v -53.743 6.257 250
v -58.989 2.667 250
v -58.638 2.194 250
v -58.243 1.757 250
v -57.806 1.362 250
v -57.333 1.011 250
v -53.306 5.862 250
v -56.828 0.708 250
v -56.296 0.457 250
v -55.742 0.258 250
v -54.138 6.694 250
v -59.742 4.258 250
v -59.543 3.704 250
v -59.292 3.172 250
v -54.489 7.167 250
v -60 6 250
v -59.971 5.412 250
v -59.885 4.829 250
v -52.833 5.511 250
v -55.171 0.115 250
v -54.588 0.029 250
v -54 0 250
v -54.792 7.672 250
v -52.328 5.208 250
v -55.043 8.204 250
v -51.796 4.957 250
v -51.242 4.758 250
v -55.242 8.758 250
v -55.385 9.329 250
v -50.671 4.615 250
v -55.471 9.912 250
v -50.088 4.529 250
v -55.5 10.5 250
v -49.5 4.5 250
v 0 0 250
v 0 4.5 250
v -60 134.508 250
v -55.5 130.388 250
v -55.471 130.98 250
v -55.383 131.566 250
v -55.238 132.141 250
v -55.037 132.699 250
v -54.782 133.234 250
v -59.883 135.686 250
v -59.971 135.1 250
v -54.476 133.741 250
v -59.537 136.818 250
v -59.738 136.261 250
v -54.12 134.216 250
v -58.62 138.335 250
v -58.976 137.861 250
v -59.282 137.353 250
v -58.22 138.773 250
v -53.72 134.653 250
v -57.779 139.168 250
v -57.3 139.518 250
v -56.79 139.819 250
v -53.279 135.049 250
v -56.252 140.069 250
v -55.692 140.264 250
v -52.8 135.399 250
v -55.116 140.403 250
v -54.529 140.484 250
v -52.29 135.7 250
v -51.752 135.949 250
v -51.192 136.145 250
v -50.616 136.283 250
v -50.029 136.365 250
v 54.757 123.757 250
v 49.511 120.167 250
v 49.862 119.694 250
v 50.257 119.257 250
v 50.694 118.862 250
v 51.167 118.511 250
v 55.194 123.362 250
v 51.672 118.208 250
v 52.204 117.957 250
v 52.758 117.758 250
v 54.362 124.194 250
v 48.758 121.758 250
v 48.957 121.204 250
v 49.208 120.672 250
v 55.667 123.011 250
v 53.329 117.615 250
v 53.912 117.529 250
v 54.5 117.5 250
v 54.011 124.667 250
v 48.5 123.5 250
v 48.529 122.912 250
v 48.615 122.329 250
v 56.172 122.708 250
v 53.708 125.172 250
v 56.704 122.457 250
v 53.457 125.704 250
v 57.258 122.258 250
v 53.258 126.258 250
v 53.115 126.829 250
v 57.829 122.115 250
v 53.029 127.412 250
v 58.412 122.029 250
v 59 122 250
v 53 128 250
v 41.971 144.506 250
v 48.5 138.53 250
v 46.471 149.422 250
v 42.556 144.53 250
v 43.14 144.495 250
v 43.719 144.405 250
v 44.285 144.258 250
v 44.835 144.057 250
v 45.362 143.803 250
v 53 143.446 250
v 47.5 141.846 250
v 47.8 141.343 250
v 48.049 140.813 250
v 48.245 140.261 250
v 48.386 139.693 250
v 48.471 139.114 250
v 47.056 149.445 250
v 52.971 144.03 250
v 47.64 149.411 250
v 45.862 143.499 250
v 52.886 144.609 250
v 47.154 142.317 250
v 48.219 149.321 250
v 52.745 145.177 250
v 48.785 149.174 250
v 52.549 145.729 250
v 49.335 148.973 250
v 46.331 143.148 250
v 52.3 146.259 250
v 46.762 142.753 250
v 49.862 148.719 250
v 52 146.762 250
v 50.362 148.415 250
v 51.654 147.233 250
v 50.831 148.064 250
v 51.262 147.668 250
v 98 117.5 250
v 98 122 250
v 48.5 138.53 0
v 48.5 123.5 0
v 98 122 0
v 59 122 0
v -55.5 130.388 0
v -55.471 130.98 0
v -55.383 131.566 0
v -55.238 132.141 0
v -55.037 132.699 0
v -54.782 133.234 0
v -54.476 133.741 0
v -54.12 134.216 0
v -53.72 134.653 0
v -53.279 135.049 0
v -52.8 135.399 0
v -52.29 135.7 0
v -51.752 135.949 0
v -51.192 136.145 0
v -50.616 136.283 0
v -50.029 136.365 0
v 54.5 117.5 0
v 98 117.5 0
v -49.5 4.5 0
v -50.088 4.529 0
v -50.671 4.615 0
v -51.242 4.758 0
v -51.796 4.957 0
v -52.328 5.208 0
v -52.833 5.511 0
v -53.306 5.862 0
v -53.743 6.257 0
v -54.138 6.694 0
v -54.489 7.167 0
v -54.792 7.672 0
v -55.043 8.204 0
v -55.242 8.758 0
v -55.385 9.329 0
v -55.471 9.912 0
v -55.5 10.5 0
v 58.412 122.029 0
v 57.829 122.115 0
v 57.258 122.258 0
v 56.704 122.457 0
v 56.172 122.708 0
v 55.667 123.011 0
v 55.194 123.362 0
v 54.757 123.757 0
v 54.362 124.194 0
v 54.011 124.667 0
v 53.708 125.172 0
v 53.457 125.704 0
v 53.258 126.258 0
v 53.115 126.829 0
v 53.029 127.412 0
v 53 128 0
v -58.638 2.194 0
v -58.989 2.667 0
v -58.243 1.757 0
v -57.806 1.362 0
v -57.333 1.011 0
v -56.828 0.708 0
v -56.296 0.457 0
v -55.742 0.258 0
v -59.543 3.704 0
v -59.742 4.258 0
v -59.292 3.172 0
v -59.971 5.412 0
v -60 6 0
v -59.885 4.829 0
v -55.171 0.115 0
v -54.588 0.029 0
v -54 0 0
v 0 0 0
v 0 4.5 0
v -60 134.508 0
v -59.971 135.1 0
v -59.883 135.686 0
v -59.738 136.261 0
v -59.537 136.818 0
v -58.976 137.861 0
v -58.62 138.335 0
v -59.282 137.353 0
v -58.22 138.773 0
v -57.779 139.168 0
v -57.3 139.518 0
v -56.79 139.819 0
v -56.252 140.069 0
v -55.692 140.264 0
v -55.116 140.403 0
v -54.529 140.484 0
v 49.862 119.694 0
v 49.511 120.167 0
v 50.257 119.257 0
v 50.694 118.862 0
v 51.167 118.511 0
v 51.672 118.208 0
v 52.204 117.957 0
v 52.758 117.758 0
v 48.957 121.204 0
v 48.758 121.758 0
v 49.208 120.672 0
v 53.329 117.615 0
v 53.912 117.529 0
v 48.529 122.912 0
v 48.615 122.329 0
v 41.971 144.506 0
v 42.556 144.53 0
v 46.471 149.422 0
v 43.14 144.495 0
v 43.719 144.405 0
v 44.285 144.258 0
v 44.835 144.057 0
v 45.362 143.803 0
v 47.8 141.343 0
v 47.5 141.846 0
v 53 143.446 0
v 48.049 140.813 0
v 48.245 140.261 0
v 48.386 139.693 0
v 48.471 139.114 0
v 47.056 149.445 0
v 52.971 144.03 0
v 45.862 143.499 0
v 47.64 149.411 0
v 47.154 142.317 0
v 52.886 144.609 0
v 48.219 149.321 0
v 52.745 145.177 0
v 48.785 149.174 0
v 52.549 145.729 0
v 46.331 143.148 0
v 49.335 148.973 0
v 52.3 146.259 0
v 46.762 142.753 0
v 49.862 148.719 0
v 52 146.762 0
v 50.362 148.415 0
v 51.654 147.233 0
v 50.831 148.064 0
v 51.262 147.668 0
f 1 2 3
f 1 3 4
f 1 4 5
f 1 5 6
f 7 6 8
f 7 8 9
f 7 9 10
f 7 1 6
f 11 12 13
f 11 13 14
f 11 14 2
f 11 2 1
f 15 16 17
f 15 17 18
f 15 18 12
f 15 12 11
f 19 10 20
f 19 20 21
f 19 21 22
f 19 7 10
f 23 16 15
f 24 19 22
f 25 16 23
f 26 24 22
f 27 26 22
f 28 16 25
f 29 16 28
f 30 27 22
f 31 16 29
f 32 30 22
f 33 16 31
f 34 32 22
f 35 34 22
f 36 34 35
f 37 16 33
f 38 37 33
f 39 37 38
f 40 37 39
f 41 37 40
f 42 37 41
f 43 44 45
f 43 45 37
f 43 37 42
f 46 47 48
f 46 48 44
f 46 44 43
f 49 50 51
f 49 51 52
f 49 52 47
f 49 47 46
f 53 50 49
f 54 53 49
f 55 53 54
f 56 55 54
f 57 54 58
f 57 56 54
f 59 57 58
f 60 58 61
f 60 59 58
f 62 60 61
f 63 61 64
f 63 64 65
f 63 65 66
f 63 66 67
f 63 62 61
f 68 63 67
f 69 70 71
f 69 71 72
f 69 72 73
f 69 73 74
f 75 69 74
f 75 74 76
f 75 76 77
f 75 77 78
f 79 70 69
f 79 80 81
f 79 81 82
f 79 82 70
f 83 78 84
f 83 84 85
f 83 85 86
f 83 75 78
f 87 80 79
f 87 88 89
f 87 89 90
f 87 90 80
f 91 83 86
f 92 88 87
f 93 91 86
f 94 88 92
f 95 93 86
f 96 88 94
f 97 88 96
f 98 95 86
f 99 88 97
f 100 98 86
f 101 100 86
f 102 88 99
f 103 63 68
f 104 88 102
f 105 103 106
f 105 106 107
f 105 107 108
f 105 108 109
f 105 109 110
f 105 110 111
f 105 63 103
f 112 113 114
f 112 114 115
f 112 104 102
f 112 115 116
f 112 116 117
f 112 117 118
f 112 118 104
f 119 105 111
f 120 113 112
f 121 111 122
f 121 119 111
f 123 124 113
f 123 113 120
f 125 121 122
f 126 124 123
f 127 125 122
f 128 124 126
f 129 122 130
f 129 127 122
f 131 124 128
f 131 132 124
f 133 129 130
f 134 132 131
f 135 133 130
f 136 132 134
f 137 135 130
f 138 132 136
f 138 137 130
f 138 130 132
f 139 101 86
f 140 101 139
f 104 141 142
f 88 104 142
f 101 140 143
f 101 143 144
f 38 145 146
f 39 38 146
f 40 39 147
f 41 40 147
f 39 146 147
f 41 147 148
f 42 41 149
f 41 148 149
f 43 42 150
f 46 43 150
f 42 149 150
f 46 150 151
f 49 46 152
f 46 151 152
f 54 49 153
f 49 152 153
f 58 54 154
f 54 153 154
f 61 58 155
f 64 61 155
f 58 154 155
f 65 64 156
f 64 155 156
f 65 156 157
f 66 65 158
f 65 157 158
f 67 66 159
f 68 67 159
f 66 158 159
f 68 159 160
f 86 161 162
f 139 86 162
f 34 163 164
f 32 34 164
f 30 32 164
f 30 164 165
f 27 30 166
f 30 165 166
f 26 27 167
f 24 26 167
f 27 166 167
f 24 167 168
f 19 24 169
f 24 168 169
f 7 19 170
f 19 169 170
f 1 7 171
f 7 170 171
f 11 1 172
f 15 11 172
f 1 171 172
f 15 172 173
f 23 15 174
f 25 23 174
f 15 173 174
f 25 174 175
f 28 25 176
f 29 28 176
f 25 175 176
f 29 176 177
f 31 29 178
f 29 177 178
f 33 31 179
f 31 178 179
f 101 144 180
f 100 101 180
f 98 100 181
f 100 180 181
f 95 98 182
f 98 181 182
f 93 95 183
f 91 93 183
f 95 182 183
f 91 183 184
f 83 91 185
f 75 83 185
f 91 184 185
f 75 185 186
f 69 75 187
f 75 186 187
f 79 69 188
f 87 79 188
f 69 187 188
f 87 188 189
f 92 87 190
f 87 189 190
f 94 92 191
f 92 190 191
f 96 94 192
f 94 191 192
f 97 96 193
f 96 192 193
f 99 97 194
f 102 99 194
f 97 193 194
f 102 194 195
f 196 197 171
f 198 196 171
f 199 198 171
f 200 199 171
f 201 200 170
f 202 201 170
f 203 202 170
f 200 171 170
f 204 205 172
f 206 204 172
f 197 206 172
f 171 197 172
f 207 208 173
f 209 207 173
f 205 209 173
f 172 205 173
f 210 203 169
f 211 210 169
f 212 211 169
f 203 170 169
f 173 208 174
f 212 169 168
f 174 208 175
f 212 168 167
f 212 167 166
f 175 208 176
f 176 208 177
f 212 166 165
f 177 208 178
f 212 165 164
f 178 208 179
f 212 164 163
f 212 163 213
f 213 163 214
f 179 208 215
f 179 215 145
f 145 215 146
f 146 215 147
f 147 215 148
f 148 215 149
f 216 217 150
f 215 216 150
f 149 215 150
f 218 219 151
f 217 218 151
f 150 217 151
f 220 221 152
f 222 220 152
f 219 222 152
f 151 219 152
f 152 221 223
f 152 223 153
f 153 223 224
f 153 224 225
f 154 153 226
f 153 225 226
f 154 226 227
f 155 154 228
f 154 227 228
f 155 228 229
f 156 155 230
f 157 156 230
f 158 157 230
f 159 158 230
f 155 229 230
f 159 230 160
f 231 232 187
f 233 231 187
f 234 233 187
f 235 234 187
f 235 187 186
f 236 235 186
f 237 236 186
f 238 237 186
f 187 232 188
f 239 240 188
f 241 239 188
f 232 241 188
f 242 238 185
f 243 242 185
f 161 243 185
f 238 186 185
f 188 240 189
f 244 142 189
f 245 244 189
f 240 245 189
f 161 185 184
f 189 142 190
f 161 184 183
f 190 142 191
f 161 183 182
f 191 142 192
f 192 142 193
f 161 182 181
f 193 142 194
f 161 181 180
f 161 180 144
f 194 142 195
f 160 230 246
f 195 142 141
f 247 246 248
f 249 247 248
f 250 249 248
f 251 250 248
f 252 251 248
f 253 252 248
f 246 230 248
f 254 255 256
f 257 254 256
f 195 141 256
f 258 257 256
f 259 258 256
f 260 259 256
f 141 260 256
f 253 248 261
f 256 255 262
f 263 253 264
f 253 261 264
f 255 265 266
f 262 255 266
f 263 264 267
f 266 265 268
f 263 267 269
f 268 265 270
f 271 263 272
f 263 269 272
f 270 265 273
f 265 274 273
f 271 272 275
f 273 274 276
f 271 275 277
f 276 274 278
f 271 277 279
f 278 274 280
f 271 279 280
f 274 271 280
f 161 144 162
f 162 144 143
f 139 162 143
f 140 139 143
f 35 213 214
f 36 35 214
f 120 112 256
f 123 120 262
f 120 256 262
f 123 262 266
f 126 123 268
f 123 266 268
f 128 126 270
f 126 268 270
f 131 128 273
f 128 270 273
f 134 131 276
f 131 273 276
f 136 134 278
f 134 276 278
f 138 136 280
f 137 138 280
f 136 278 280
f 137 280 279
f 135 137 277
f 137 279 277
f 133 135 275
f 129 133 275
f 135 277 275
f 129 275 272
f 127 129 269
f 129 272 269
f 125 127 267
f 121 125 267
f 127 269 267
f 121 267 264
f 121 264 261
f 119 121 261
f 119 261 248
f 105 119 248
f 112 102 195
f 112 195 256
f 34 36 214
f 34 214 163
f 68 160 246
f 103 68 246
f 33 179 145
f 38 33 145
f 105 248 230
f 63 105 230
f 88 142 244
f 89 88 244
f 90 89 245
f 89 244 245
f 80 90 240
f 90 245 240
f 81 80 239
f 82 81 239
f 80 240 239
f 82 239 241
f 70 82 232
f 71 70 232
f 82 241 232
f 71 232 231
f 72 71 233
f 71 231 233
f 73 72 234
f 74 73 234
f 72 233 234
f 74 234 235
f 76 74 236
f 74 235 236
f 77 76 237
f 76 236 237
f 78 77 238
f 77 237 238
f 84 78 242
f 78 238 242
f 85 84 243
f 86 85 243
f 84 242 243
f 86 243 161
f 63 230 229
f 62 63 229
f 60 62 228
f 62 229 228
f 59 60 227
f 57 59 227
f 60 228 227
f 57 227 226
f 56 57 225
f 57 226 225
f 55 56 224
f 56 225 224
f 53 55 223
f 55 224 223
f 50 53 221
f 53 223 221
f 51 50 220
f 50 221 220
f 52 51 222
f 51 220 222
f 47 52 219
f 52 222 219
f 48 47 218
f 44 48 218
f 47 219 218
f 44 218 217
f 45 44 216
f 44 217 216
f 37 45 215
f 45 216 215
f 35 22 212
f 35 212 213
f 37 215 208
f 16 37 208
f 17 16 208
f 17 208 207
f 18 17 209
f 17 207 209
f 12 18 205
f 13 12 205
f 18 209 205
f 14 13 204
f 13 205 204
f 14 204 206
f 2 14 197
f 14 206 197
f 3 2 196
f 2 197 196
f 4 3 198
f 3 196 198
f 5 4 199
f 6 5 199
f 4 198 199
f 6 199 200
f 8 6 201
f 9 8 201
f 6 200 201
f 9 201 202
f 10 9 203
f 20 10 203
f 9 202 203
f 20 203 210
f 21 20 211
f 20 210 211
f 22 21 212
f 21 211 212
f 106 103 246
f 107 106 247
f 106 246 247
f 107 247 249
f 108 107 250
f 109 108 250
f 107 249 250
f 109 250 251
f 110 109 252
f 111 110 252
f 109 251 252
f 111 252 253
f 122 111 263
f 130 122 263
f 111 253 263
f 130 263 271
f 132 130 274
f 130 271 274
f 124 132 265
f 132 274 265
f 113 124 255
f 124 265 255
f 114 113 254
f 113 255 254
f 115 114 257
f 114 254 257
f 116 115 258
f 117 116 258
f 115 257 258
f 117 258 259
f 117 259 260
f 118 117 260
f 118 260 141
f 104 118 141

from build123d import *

# Parameters (mm, degrees)
F1_DEPTH = 250


with BuildPart() as f1:
    # F0 (on Top) → F1 (new body)
    with BuildSketch(Plane.XY):
        with BuildLine():
            Line((-54, 0), (0, 0))
            Line((0, 0), (0, 4.5))
            Line((0, 4.5), (-49.5, 4.5))
            ThreePointArc((-49.5, 4.5), (-53.742641, 6.257359), (-55.5, 10.5))
            Line((-55.5, 10.5), (-55.5, 130.388169))
            ThreePointArc((-55.5, 130.388169), (-53.925689, 134.439499), (-50.028906, 136.364811))
            Line((-50.028906, 136.364811), (41.971094, 144.506404))
            ThreePointArc((41.971094, 144.506404), (46.551331, 142.95545), (48.5, 138.529761))
            Line((48.5, 138.529761), (48.5, 123.5))
            ThreePointArc((48.5, 123.5), (50.257359, 119.257359), (54.5, 117.5))
            Line((54.5, 117.5), (98, 117.5))
            Line((98, 117.5), (98, 122))
            Line((98, 122), (59, 122))
            ThreePointArc((59, 122), (54.757359, 123.757359), (53, 128))
            Line((53, 128), (53, 143.445578))
            ThreePointArc((53, 143.445578), (51.051331, 147.871267), (46.471094, 149.422221))
            Line((46.471094, 149.422221), (-54.528906, 140.484168))
            ThreePointArc((-54.528906, 140.484168), (-58.425689, 138.558856), (-60, 134.507525))
            Line((-60, 134.507525), (-60, 6))
            ThreePointArc((-60, 6), (-58.242641, 1.757359), (-54, 0))
        make_face()
    extrude(amount=F1_DEPTH)


solid = f1.part
